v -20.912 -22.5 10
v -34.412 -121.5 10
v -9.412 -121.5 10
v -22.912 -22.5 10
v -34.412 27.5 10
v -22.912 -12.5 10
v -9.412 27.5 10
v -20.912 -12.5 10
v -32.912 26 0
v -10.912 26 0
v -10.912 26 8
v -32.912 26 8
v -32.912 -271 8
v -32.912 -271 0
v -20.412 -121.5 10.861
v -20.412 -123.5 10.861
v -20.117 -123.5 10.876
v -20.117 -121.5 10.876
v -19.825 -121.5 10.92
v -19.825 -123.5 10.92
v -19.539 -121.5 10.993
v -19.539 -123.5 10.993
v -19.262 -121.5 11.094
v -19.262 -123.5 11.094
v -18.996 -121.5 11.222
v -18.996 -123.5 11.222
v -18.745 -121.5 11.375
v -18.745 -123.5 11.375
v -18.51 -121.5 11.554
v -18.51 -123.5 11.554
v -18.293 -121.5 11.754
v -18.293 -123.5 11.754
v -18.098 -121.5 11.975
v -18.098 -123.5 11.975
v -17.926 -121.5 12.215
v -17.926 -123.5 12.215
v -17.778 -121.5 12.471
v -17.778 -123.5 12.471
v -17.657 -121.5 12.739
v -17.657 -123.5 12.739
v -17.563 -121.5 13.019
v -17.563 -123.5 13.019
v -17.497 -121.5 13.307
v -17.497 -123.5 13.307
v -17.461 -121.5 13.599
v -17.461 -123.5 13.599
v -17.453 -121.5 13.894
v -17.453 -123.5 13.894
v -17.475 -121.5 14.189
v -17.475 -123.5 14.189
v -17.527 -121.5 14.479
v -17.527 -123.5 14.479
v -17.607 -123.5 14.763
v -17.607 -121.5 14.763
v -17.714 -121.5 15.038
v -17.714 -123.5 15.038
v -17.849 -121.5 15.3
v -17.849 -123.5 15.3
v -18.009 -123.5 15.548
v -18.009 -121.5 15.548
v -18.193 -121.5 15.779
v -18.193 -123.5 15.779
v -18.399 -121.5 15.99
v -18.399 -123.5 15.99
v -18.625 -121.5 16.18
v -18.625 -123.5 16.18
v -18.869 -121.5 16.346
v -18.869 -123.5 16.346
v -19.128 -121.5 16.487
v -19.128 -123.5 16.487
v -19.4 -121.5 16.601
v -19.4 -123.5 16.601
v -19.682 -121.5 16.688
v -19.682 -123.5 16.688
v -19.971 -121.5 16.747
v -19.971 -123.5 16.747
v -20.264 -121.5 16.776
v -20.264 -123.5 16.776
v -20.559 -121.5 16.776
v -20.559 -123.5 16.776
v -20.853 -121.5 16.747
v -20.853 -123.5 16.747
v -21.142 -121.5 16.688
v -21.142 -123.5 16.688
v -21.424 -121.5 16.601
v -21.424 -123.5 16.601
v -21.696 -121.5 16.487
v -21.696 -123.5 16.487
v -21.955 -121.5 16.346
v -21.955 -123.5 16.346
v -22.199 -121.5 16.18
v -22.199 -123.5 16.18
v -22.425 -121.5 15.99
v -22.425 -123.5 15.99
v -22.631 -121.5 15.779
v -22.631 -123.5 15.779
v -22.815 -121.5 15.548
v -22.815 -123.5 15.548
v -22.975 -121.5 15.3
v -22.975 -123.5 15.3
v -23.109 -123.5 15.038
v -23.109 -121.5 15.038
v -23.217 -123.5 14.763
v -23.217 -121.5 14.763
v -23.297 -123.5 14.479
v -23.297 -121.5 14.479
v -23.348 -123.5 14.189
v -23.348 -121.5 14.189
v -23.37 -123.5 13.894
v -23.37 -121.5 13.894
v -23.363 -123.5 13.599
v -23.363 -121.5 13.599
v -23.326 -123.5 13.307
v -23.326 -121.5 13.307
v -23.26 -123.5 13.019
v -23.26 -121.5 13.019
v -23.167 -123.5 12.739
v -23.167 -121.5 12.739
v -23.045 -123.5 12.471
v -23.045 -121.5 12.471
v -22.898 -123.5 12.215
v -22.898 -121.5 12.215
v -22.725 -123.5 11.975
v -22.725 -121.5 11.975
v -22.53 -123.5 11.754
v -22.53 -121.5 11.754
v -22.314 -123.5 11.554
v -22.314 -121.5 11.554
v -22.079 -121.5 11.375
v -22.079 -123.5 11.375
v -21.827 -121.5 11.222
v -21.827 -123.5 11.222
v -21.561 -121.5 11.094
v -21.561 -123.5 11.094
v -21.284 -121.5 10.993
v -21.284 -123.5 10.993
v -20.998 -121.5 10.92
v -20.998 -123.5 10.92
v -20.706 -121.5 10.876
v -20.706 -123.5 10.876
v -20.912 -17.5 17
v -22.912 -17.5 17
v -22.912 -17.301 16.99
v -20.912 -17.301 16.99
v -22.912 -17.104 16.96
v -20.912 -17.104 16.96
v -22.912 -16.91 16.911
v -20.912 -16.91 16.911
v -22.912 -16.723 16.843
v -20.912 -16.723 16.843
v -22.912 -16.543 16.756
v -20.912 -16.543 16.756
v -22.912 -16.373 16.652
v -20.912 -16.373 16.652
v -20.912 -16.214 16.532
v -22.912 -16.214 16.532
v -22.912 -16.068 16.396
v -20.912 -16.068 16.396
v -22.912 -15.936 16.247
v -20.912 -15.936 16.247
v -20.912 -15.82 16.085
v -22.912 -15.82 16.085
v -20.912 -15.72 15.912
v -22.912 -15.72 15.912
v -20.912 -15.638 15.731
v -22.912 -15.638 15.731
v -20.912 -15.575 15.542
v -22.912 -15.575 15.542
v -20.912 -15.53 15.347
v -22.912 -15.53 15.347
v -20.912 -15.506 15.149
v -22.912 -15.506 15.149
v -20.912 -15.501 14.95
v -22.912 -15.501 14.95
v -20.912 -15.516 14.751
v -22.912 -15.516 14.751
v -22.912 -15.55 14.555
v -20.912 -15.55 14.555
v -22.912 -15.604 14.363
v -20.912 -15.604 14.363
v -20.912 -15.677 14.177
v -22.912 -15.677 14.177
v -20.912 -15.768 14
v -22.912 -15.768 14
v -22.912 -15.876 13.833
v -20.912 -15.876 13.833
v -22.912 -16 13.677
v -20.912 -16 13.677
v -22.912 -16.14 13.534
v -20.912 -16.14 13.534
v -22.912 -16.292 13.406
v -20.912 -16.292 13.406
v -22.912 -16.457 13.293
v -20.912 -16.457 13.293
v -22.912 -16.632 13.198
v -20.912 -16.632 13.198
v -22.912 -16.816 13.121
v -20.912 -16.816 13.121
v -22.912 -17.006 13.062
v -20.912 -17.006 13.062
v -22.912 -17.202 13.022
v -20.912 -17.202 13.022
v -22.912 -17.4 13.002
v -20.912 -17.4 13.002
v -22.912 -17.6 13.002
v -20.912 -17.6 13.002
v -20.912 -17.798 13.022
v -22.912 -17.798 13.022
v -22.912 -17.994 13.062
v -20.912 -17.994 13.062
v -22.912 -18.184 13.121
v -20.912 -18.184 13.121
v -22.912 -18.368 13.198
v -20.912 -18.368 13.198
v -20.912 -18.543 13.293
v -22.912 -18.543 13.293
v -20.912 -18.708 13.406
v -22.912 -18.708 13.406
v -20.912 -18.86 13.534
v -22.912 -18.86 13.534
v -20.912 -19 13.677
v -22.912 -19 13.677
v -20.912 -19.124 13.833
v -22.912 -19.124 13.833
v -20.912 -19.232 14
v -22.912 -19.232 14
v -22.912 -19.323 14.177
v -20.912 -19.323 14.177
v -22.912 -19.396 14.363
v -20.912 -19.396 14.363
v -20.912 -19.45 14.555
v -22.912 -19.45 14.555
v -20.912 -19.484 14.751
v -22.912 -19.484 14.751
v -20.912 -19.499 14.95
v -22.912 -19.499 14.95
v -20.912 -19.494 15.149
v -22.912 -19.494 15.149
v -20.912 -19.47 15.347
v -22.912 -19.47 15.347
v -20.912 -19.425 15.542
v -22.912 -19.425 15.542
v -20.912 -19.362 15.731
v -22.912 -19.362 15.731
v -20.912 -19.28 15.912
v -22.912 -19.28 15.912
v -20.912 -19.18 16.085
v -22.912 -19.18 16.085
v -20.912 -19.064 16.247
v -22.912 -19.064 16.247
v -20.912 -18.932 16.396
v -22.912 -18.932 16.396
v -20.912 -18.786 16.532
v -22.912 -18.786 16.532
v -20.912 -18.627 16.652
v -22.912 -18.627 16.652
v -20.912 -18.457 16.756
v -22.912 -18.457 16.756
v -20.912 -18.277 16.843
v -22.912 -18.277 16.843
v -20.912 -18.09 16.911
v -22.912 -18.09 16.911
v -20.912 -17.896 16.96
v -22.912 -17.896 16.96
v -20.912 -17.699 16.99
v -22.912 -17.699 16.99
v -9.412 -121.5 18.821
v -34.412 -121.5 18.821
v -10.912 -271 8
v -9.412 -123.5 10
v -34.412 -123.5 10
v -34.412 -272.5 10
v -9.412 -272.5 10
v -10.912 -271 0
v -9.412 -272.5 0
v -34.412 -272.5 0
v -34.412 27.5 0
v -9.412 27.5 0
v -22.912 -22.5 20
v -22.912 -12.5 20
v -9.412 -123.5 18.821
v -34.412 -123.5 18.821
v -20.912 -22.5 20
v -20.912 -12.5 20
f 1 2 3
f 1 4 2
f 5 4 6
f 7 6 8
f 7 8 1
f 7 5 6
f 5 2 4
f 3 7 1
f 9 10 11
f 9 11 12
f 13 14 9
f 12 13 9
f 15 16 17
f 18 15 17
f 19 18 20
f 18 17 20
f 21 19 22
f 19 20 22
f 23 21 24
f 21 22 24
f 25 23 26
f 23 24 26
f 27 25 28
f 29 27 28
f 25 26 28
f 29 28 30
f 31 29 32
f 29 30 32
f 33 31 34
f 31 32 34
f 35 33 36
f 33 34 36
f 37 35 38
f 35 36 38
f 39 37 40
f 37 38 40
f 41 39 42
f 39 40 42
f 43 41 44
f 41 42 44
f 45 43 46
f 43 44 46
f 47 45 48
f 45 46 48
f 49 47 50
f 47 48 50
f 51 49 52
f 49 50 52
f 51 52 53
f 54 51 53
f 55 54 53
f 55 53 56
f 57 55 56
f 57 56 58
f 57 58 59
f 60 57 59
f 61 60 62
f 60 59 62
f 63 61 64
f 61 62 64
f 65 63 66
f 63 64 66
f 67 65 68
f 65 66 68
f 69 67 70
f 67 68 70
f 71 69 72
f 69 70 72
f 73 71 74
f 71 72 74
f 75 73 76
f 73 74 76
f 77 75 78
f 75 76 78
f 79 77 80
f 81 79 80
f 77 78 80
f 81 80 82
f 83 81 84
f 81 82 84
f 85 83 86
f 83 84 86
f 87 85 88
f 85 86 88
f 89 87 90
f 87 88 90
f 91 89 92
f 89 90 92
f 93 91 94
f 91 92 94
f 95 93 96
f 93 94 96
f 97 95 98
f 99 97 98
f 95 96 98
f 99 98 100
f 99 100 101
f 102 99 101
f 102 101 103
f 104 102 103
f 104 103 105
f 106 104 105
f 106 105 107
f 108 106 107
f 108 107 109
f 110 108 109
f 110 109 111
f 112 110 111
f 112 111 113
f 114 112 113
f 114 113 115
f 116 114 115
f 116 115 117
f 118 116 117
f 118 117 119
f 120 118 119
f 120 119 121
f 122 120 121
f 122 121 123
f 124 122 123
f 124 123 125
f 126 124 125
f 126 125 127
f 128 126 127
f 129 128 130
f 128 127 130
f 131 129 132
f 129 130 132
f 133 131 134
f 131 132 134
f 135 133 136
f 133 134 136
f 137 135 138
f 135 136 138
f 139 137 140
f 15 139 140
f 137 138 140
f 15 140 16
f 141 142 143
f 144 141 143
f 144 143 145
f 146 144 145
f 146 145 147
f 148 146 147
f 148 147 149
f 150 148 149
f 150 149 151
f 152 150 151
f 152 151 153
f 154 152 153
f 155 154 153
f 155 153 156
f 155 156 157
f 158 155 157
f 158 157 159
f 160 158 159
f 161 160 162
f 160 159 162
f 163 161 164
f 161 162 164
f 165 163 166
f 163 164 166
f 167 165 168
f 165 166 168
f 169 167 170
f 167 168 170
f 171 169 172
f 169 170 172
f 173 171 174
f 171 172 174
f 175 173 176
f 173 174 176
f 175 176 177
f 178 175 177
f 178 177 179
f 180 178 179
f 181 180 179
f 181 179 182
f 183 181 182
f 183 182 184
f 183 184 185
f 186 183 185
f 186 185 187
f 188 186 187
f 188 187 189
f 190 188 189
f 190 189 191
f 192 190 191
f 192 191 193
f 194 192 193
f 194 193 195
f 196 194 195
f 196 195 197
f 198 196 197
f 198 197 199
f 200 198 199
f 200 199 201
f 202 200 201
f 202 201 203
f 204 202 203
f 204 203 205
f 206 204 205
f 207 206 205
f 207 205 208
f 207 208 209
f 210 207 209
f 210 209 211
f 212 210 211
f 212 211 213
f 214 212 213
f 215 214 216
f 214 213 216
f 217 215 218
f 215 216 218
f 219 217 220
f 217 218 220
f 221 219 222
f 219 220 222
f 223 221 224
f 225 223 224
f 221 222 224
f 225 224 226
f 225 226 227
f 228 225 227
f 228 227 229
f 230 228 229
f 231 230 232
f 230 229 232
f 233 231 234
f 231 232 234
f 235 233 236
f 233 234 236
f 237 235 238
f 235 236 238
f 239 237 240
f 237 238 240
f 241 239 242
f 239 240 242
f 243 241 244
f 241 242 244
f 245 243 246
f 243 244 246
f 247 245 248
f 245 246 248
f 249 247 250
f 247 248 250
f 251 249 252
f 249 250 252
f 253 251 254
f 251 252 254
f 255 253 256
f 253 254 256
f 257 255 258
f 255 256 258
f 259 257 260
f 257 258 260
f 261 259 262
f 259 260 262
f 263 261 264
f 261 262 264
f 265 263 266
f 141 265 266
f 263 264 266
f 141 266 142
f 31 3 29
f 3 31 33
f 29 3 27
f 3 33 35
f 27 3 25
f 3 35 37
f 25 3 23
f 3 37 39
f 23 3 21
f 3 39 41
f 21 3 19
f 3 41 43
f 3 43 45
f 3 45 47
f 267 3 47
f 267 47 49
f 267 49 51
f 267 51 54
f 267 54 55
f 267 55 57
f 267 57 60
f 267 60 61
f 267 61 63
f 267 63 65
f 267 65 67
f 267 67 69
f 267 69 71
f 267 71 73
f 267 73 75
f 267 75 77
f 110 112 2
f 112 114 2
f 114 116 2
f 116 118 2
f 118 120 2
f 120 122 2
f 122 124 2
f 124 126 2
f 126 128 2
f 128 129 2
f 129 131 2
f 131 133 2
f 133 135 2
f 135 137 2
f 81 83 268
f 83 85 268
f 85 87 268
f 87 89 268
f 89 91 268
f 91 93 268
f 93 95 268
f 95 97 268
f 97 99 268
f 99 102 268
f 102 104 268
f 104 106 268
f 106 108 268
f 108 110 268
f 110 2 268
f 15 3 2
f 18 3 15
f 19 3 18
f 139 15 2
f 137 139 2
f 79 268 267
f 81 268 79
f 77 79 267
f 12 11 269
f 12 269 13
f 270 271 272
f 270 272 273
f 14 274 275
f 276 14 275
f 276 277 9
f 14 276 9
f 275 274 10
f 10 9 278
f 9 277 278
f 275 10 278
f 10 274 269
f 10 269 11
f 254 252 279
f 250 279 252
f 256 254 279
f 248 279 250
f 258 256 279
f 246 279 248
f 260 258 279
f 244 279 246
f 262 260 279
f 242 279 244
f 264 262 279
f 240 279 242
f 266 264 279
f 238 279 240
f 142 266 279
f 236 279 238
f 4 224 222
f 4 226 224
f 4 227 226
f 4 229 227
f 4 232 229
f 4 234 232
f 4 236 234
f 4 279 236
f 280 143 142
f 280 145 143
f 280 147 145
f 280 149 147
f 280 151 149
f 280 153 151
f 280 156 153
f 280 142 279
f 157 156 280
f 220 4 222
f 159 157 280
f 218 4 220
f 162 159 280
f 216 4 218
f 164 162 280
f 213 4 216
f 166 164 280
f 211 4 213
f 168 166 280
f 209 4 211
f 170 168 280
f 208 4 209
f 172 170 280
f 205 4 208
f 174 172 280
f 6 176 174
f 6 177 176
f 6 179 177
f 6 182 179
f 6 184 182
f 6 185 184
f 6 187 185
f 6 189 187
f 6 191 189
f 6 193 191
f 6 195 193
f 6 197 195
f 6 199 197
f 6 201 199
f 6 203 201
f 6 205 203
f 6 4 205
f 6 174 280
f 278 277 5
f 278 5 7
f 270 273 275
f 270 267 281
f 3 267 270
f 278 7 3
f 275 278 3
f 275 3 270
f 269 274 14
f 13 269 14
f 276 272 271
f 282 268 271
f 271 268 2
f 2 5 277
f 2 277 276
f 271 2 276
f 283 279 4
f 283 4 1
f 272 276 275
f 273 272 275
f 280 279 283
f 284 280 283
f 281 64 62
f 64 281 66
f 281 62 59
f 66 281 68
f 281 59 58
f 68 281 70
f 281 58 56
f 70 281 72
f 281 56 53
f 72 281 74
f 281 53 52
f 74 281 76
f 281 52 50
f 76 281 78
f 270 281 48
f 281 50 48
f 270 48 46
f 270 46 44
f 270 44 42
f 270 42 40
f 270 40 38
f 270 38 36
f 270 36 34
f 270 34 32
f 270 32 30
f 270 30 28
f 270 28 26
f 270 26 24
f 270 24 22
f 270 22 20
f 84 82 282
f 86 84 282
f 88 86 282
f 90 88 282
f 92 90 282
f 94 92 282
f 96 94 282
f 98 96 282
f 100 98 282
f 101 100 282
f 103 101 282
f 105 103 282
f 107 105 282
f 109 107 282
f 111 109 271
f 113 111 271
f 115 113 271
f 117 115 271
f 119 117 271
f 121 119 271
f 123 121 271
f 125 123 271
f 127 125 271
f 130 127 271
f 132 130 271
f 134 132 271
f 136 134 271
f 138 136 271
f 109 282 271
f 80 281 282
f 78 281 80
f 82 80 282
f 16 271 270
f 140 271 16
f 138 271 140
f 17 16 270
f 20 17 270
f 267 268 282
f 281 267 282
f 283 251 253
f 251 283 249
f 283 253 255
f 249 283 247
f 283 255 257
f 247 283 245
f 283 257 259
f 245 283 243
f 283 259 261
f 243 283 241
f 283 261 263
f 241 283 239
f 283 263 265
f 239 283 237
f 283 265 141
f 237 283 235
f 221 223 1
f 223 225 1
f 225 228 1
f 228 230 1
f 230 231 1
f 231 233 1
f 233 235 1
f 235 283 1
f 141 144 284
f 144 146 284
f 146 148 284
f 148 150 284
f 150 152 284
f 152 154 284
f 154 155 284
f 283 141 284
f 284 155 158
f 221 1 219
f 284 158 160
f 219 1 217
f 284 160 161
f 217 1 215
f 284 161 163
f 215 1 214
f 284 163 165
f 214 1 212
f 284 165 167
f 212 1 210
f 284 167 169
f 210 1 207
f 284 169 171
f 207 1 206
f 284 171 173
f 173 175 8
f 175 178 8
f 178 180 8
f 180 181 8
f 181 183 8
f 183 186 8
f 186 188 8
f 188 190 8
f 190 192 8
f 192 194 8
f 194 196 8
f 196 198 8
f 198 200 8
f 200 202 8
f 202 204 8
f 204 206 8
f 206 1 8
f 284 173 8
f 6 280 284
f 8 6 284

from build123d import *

# Parameters (mm, degrees)
SKETCH1_W           = 25
SKETCH1_H           = 300
SKETCH1_W_2         = 22
SKETCH1_H_2         = 297
BOSS_EXTRUDE1_DEPTH = 10
SKETCH3_W           = 22
SKETCH3_H           = 297
BOSS_EXTRUDE2_DEPTH = 1.5
BOSS_EXTRUDE3_DEPTH = 25
SKETCH7_R           = 2.959313076
CUT_EXTRUDE1_DEPTH  = 2
SKETCH9_W           = 2
SKETCH9_H           = 10
BOSS_EXTRUDE4_DEPTH = 10
SKETCH10_R          = 2
CUT_EXTRUDE2_DEPTH  = 15
SKETCH11_W          = 22
SKETCH11_H          = 297
CUT_EXTRUDE7_DEPTH  = 8


with BuildPart() as part:
    # Sketch1 → Boss-Extrude1 (new body)
    with BuildSketch(Plane.XY):
        with Locations((-21.911764706, -122.5)):
            Rectangle(SKETCH1_W, SKETCH1_H)
        with Locations((-21.911764706, -122.5)):
            Rectangle(SKETCH1_W_2, SKETCH1_H_2, mode=Mode.SUBTRACT)
    extrude(amount=BOSS_EXTRUDE1_DEPTH)

    # Sketch3 → Boss-Extrude2 (add)
    with BuildSketch(Plane.XY.offset(10)):
        with Locations((-21.911764706, -122.5)):
            Rectangle(SKETCH3_W, SKETCH3_H)
    extrude(amount=-BOSS_EXTRUDE2_DEPTH)

    # Sketch6 → Boss-Extrude3 (add)
    with BuildSketch(Plane.ZY.offset(34.411764706)):
        Polygon((10, -121.5), (18.820577113, -121.5), (18.820577113, -123.5), (10, -123.5), (10, -272.5), (0, -272.5), (0, 27.5), (10, 27.5), align=None)
    extrude(amount=-BOSS_EXTRUDE3_DEPTH)

    # Sketch7 → Cut-Extrude1 (cut)
    with BuildSketch(Plane.XZ.offset(123.5)):
        with Locations(Location((-20.411764706, 13.820577113, 0), (0, 0, 270))):
            Circle(SKETCH7_R)
    extrude(amount=-CUT_EXTRUDE1_DEPTH, mode=Mode.SUBTRACT)

    # Sketch9 → Boss-Extrude4 (add)
    with BuildSketch(Plane.XY.offset(10)):
        with Locations((-21.911764706, -17.5)):
            Rectangle(SKETCH9_W, SKETCH9_H)
    extrude(amount=BOSS_EXTRUDE4_DEPTH)

    # Sketch10 → Cut-Extrude2 (cut)
    with BuildSketch(Plane.ZY.offset(34.411764706)):
        with Locations((15, -17.5)):
            Circle(SKETCH10_R)
    extrude(amount=-CUT_EXTRUDE2_DEPTH, mode=Mode.SUBTRACT)

    # Sketch11 → Cut-Extrude7 (cut)
    with BuildSketch(Plane(origin=(0, 0, 0), x_dir=(-1, 0, 0), z_dir=(0, 0, -1))):
        with Locations((21.911764706, -122.5)):
            Rectangle(SKETCH11_W, SKETCH11_H)
    extrude(amount=-CUT_EXTRUDE7_DEPTH, mode=Mode.SUBTRACT)


solid = part.part
